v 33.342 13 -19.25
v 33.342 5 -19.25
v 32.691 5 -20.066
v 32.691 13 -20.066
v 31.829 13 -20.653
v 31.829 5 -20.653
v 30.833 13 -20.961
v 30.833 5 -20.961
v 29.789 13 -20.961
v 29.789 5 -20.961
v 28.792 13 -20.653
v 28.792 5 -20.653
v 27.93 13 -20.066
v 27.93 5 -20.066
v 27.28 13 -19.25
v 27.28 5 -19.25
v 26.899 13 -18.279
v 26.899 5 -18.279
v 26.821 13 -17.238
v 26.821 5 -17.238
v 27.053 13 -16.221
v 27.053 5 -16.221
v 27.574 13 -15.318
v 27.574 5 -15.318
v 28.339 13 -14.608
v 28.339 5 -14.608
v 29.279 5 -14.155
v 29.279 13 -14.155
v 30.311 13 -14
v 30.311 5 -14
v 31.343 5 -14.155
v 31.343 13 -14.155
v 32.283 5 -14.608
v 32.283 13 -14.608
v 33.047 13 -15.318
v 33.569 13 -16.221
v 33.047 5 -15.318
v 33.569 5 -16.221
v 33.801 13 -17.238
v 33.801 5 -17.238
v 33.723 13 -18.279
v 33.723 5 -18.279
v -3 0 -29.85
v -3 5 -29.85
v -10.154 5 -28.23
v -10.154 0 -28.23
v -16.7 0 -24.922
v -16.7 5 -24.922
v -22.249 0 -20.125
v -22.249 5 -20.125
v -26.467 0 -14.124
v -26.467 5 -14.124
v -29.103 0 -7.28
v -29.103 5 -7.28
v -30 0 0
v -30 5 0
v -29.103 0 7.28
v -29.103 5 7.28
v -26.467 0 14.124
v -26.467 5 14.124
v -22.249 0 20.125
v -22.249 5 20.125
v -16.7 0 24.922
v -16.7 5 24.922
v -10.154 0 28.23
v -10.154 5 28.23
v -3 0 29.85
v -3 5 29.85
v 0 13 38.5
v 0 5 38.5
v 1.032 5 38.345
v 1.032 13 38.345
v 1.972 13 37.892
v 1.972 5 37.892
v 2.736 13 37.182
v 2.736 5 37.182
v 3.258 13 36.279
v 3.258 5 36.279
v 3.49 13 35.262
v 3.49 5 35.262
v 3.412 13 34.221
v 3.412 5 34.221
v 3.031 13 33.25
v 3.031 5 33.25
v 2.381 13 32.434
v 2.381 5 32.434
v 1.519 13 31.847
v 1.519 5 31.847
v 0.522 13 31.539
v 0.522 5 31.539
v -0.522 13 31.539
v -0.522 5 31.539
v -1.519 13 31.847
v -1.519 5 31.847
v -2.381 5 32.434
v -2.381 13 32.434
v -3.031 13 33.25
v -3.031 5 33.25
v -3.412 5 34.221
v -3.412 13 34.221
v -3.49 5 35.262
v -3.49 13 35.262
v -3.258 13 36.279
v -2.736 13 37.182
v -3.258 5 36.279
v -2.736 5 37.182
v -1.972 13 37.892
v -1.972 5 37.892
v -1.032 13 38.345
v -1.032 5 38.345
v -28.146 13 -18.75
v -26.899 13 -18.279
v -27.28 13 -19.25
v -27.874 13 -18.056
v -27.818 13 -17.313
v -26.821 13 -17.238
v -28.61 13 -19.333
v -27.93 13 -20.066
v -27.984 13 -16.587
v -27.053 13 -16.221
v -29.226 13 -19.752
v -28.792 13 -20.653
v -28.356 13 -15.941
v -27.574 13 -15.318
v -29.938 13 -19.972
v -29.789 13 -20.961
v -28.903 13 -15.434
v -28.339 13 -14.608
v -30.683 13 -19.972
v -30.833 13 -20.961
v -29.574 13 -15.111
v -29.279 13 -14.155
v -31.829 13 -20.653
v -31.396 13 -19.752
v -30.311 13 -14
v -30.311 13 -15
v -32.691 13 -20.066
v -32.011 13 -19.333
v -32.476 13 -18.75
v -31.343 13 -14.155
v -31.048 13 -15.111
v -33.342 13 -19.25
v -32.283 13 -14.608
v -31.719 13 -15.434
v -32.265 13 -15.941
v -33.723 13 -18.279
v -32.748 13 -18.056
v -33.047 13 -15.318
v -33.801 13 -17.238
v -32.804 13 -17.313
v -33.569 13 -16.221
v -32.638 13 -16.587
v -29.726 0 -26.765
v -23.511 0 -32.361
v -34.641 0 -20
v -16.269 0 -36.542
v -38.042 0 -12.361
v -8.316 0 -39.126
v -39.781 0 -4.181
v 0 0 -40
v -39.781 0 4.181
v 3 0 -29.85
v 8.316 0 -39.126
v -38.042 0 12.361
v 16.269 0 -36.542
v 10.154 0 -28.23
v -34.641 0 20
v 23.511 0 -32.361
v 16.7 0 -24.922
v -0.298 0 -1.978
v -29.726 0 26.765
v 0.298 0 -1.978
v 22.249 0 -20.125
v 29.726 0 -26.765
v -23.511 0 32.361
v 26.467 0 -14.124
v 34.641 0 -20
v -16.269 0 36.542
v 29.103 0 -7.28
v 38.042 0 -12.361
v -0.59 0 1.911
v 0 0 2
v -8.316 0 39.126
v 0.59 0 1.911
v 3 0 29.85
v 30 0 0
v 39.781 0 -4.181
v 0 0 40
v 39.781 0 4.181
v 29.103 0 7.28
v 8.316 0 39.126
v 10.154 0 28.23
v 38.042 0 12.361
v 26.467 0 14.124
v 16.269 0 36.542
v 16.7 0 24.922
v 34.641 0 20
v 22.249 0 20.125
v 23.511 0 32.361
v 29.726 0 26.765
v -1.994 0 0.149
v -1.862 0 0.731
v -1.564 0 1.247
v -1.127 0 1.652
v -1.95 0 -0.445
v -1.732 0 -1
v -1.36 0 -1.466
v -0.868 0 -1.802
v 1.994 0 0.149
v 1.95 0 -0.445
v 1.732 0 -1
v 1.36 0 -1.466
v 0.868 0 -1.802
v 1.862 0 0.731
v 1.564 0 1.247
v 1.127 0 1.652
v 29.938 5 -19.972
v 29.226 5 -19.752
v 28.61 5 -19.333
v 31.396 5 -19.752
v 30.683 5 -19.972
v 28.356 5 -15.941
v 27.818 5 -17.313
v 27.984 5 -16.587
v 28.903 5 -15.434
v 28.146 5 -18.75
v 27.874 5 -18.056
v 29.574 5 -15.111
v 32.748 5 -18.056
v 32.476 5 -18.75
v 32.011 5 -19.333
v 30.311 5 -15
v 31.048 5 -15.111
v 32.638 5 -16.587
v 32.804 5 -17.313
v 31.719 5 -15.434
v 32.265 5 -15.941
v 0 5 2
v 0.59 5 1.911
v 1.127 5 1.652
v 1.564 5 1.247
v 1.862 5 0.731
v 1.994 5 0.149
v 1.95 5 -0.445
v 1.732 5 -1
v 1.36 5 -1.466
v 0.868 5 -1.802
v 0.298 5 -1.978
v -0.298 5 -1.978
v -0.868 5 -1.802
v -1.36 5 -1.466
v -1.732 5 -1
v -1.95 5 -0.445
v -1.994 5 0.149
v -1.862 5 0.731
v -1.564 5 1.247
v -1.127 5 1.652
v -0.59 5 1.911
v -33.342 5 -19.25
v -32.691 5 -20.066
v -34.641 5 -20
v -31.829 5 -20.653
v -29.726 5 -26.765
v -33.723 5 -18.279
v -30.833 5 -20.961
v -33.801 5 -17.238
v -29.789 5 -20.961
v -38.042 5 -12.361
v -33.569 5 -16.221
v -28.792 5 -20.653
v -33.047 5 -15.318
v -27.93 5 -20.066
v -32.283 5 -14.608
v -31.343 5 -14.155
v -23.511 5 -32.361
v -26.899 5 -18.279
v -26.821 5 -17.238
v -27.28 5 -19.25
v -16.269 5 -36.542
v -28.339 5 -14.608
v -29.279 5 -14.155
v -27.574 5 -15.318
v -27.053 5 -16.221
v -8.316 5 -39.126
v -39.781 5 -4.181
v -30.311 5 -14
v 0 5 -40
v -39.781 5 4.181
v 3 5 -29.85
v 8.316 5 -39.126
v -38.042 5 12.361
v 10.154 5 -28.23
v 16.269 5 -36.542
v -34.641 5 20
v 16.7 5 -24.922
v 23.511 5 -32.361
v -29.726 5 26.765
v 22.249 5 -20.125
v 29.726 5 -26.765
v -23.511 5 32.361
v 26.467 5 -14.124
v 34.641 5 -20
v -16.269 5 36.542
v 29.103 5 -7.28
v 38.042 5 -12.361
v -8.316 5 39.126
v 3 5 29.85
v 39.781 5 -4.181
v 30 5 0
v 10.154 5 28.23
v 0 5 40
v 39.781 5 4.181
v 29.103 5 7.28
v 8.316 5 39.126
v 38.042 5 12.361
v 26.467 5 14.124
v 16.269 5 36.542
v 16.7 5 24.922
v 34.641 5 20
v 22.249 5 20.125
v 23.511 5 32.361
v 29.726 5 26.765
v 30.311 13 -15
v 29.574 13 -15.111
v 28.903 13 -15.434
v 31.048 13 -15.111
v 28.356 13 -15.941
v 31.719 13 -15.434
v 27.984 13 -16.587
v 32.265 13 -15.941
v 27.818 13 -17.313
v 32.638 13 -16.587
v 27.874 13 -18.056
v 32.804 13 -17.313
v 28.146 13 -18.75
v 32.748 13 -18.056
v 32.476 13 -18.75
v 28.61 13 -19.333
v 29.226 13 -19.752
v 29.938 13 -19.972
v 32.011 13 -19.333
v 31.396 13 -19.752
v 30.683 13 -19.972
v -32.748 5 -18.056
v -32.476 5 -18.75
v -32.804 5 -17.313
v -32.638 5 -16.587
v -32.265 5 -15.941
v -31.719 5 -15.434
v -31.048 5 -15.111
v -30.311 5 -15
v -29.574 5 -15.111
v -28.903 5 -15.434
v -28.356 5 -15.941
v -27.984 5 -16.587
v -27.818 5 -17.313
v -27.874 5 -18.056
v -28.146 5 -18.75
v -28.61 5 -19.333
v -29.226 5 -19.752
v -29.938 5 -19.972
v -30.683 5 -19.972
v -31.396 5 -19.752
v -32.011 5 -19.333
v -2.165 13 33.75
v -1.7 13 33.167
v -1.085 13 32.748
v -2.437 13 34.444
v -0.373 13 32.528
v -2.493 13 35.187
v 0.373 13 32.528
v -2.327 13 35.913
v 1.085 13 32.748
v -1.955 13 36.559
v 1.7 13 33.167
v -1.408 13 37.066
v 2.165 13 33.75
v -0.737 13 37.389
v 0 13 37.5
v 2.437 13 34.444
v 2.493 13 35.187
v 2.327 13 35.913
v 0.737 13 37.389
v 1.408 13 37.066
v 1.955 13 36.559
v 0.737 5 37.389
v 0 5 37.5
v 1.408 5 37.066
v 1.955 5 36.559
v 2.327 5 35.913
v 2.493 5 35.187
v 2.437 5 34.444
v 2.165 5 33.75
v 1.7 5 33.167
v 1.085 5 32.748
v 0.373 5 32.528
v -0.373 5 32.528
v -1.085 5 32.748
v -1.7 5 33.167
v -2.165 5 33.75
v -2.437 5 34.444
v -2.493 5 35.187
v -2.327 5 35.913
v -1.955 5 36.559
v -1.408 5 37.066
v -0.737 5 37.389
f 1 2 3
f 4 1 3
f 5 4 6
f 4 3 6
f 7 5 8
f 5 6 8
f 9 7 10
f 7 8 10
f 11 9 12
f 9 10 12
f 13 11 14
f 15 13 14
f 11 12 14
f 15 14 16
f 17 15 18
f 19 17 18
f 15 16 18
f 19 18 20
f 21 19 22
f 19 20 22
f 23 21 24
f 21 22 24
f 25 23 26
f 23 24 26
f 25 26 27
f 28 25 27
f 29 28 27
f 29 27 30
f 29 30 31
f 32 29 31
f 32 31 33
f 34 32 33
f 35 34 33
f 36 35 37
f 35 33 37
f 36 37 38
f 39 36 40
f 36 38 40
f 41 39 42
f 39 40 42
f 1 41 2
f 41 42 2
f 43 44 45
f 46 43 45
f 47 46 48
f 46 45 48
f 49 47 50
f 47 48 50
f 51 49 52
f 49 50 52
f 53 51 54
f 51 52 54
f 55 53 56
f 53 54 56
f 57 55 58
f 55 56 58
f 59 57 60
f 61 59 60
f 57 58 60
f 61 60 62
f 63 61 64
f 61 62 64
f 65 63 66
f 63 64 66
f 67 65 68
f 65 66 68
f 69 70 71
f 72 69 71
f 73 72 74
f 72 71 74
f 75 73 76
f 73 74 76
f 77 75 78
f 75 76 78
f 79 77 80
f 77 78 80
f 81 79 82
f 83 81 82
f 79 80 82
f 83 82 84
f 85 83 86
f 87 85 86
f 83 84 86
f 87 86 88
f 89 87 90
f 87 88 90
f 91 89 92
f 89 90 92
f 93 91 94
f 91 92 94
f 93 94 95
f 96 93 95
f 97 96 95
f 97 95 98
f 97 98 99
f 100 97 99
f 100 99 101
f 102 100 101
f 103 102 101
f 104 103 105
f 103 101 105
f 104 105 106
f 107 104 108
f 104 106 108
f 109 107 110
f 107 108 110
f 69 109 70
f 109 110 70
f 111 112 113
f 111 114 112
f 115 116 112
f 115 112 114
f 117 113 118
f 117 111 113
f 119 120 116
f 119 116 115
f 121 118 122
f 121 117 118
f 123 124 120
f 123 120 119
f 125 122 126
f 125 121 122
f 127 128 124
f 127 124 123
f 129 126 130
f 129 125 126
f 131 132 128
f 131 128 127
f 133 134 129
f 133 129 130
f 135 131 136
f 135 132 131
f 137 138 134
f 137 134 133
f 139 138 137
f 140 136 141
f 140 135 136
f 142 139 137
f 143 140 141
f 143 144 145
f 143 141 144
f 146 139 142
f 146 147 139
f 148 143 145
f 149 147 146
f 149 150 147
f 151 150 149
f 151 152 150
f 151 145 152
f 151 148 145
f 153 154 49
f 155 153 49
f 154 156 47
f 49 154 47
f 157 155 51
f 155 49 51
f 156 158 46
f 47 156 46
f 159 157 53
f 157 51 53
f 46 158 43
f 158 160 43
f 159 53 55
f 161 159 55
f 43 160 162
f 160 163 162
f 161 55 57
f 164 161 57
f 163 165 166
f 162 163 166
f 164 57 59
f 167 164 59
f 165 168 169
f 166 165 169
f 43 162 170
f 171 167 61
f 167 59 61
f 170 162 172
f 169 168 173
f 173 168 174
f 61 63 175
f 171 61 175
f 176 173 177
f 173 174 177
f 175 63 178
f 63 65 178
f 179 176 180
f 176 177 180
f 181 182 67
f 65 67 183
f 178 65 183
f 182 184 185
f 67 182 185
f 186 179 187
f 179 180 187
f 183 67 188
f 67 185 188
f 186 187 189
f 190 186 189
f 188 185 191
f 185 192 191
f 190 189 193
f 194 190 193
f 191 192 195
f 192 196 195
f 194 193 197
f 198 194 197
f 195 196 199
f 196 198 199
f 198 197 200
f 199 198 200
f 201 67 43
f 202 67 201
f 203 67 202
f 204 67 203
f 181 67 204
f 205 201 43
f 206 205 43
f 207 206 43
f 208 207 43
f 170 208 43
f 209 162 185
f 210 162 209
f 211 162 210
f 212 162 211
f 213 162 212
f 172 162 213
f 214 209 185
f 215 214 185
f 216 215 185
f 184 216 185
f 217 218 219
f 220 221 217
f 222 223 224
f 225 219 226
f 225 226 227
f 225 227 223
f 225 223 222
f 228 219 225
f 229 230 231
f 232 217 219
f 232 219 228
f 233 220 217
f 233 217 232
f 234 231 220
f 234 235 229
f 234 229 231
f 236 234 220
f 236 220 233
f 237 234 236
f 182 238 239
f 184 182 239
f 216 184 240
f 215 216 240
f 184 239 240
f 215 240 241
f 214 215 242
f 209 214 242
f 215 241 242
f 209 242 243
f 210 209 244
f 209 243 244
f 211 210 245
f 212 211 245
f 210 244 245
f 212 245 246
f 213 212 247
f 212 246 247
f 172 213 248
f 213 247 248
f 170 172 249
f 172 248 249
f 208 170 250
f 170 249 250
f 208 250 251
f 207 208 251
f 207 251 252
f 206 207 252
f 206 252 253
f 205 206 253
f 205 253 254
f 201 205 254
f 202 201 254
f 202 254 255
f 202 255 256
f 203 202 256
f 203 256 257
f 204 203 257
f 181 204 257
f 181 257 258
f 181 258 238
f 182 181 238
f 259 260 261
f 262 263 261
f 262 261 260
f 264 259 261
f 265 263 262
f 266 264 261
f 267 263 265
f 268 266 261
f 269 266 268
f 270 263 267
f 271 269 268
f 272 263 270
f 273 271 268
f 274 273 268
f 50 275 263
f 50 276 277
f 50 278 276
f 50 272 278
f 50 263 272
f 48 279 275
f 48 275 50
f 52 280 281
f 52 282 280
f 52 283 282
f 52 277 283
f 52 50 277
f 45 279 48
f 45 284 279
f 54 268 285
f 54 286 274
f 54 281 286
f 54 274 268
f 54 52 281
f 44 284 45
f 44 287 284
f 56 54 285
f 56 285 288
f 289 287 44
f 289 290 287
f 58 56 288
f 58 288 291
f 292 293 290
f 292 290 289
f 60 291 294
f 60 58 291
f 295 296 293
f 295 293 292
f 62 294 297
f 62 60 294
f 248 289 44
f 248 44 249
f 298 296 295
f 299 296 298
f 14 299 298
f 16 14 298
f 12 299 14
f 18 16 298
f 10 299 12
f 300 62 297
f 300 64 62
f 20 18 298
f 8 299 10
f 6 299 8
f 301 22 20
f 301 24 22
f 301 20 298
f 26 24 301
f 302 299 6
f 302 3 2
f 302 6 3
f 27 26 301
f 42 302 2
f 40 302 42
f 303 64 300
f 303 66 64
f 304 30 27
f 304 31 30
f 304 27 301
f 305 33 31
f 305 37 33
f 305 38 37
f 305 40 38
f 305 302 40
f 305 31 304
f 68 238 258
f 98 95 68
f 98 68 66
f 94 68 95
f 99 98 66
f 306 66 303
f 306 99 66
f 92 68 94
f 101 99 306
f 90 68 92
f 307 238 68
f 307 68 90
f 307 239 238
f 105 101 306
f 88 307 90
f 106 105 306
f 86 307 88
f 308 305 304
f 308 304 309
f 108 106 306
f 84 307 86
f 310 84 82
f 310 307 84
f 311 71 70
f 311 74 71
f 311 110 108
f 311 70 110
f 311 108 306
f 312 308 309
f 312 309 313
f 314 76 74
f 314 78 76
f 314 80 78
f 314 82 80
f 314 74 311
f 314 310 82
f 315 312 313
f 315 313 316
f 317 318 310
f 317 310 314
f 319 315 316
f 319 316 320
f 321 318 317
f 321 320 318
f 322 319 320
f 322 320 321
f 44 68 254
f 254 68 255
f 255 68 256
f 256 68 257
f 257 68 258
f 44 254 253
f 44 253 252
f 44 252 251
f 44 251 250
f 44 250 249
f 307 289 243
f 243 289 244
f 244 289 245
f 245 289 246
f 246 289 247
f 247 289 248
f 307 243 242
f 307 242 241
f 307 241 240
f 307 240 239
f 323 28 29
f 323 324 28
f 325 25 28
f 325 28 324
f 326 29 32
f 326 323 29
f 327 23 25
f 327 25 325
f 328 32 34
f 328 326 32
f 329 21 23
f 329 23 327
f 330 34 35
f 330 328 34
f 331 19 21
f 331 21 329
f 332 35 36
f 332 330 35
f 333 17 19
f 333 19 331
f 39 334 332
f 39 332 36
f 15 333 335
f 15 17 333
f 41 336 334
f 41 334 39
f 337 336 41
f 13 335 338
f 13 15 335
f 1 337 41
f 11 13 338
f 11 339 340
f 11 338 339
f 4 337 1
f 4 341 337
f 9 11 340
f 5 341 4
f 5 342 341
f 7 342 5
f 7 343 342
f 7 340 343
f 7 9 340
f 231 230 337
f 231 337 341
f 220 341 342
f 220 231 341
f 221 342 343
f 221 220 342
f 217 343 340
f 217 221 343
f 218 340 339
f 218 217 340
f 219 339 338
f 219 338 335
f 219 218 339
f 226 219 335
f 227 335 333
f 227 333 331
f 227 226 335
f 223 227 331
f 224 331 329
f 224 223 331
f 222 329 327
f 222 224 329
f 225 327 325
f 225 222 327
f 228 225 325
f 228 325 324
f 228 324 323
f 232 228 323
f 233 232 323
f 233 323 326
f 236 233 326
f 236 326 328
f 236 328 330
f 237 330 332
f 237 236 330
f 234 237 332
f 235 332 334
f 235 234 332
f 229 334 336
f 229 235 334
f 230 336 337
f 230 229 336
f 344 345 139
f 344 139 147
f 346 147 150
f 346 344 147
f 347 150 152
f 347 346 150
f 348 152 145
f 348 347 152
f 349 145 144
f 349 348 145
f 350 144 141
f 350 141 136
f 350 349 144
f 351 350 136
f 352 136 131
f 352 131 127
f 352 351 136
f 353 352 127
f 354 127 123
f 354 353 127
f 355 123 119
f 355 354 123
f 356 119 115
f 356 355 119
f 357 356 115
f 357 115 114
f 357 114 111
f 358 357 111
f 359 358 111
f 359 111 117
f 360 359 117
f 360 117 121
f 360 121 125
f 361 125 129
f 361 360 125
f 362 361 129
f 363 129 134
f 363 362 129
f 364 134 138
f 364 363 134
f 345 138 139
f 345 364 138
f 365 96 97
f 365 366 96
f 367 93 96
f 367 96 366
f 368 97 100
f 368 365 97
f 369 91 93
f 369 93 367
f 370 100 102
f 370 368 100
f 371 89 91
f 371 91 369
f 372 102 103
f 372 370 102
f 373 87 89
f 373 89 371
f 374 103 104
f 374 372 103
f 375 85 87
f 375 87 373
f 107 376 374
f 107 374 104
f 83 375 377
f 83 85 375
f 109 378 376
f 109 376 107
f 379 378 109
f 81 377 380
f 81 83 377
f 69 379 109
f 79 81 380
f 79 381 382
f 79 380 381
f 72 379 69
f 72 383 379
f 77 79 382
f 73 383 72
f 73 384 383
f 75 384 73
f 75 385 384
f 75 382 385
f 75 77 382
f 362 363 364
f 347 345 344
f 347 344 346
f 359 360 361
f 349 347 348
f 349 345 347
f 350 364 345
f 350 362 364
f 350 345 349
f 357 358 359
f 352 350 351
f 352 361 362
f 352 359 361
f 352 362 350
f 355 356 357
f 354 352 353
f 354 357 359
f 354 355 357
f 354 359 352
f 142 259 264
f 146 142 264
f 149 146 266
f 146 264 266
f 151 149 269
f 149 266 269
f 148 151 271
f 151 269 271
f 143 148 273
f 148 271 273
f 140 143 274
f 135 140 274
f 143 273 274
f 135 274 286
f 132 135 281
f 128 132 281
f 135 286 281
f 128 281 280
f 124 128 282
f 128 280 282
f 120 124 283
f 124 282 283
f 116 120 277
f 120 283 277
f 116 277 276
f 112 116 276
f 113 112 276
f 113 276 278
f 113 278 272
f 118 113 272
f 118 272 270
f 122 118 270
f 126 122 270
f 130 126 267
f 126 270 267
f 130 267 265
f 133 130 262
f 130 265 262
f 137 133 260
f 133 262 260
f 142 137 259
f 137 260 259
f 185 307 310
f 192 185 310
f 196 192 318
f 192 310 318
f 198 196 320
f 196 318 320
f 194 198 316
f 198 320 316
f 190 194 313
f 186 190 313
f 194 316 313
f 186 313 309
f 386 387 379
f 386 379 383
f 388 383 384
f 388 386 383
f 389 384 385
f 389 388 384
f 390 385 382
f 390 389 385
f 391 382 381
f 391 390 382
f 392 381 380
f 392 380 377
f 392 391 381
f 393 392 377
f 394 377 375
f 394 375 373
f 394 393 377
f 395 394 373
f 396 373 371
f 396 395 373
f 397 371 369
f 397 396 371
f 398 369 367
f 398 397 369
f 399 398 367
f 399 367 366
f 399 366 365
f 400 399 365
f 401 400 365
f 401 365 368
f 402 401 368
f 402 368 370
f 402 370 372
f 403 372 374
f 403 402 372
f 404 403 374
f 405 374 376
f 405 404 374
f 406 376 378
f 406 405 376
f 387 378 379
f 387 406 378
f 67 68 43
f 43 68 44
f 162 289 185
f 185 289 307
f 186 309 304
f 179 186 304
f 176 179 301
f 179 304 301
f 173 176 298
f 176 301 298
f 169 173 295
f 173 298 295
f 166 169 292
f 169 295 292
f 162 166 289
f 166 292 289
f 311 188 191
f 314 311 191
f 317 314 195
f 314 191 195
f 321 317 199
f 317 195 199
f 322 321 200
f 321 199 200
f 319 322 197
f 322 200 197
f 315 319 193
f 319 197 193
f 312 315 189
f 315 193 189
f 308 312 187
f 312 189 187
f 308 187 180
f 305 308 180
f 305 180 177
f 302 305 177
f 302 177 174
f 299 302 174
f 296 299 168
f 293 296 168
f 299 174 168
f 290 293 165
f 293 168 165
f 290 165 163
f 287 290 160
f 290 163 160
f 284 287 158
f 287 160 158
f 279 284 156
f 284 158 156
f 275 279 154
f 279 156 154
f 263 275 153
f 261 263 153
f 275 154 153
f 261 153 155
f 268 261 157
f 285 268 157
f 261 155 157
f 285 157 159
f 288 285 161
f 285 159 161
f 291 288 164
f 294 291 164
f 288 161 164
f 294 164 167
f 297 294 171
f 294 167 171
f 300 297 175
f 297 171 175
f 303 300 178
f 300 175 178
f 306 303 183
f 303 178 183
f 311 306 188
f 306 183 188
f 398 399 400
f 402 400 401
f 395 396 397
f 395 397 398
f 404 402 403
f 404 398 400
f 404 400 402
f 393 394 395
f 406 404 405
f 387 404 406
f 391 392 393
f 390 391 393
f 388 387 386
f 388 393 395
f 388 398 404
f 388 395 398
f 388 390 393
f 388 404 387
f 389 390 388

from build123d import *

# Parameters (mm, degrees)
SKETCH_3_R               = 40
EXTRUDE_2_DEPTH          = 5
CUT_EXTRUDE_2_DEPTH      = 10
SKETCH_6_R               = 2
CUT_EXTRUDE_3_DEPTH      = 10
SKETCH_8_R               = 3.5
SKETCH_8_R_2             = 2.5
EXTRUDE_3_DEPTH          = 8
PATTERN_CIRCULAR_1_COUNT = 3


with BuildPart() as part:
    # 草图3 → 凸台-拉伸2 (new body)
    with BuildSketch(Plane(origin=(0, 0, 0), x_dir=(1, 0, 0), z_dir=(0, 1, 0))):
        with Locations(Location((0, 0, 0), (0, 0, 270))):
            Circle(SKETCH_3_R)
    extrude(amount=EXTRUDE_2_DEPTH)

    # 草图5 → 切除-拉伸2 (cut)
    with BuildSketch(Plane(origin=(0, 5, 0), x_dir=(1, 0, 0), z_dir=(0, 1, 0))):
        with BuildLine():
            Line((-3, -29.849623113), (-3, 29.849623113))
            ThreePointArc((-3, 29.849623113), (-30, 0), (-3, -29.849623113))
        make_face()
        with BuildLine():
            ThreePointArc((30, 0), (22.248595461, 20.124611797), (3, 29.849623113))
            Line((3, 29.849623113), (3, -29.849623113))
            ThreePointArc((3, -29.849623113), (22.248595461, -20.124611797), (30, 0))
        make_face()
    extrude(amount=-CUT_EXTRUDE_2_DEPTH, mode=Mode.SUBTRACT)

    # 草图6 → 切除-拉伸3 (cut)
    with BuildSketch(Plane(origin=(0, 5, 0), x_dir=(1, 0, 0), z_dir=(0, 1, 0))):
        with Locations(Location((0, 0, 0), (0, 0, 270))):
            Circle(SKETCH_6_R)
    extrude(amount=-CUT_EXTRUDE_3_DEPTH, mode=Mode.SUBTRACT)

    # 草图8 → 凸台-拉伸3 (add)
    with BuildSketch(Plane(origin=(0, 5, 0), x_dir=(1, 0, 0), z_dir=(0, 1, 0))):
        with Locations(Location((0, -35, 0), (0, 0, 270))):
            Circle(SKETCH_8_R)
        with Locations(Location((0, -35, 0), (0, 0, 270))):
            Circle(SKETCH_8_R_2, mode=Mode.SUBTRACT)
    extrude_3 = extrude(amount=EXTRUDE_3_DEPTH)

    # 阵列(圆周)1: 凸台-拉伸3 ×3 about axis
    pattern_circular_1_axis = Axis((0, 0, 0), (0, 1, 0))
    for i in range(1, PATTERN_CIRCULAR_1_COUNT):
        add(extrude_3.rotate(pattern_circular_1_axis, i * 360 / PATTERN_CIRCULAR_1_COUNT))


solid = part.part
